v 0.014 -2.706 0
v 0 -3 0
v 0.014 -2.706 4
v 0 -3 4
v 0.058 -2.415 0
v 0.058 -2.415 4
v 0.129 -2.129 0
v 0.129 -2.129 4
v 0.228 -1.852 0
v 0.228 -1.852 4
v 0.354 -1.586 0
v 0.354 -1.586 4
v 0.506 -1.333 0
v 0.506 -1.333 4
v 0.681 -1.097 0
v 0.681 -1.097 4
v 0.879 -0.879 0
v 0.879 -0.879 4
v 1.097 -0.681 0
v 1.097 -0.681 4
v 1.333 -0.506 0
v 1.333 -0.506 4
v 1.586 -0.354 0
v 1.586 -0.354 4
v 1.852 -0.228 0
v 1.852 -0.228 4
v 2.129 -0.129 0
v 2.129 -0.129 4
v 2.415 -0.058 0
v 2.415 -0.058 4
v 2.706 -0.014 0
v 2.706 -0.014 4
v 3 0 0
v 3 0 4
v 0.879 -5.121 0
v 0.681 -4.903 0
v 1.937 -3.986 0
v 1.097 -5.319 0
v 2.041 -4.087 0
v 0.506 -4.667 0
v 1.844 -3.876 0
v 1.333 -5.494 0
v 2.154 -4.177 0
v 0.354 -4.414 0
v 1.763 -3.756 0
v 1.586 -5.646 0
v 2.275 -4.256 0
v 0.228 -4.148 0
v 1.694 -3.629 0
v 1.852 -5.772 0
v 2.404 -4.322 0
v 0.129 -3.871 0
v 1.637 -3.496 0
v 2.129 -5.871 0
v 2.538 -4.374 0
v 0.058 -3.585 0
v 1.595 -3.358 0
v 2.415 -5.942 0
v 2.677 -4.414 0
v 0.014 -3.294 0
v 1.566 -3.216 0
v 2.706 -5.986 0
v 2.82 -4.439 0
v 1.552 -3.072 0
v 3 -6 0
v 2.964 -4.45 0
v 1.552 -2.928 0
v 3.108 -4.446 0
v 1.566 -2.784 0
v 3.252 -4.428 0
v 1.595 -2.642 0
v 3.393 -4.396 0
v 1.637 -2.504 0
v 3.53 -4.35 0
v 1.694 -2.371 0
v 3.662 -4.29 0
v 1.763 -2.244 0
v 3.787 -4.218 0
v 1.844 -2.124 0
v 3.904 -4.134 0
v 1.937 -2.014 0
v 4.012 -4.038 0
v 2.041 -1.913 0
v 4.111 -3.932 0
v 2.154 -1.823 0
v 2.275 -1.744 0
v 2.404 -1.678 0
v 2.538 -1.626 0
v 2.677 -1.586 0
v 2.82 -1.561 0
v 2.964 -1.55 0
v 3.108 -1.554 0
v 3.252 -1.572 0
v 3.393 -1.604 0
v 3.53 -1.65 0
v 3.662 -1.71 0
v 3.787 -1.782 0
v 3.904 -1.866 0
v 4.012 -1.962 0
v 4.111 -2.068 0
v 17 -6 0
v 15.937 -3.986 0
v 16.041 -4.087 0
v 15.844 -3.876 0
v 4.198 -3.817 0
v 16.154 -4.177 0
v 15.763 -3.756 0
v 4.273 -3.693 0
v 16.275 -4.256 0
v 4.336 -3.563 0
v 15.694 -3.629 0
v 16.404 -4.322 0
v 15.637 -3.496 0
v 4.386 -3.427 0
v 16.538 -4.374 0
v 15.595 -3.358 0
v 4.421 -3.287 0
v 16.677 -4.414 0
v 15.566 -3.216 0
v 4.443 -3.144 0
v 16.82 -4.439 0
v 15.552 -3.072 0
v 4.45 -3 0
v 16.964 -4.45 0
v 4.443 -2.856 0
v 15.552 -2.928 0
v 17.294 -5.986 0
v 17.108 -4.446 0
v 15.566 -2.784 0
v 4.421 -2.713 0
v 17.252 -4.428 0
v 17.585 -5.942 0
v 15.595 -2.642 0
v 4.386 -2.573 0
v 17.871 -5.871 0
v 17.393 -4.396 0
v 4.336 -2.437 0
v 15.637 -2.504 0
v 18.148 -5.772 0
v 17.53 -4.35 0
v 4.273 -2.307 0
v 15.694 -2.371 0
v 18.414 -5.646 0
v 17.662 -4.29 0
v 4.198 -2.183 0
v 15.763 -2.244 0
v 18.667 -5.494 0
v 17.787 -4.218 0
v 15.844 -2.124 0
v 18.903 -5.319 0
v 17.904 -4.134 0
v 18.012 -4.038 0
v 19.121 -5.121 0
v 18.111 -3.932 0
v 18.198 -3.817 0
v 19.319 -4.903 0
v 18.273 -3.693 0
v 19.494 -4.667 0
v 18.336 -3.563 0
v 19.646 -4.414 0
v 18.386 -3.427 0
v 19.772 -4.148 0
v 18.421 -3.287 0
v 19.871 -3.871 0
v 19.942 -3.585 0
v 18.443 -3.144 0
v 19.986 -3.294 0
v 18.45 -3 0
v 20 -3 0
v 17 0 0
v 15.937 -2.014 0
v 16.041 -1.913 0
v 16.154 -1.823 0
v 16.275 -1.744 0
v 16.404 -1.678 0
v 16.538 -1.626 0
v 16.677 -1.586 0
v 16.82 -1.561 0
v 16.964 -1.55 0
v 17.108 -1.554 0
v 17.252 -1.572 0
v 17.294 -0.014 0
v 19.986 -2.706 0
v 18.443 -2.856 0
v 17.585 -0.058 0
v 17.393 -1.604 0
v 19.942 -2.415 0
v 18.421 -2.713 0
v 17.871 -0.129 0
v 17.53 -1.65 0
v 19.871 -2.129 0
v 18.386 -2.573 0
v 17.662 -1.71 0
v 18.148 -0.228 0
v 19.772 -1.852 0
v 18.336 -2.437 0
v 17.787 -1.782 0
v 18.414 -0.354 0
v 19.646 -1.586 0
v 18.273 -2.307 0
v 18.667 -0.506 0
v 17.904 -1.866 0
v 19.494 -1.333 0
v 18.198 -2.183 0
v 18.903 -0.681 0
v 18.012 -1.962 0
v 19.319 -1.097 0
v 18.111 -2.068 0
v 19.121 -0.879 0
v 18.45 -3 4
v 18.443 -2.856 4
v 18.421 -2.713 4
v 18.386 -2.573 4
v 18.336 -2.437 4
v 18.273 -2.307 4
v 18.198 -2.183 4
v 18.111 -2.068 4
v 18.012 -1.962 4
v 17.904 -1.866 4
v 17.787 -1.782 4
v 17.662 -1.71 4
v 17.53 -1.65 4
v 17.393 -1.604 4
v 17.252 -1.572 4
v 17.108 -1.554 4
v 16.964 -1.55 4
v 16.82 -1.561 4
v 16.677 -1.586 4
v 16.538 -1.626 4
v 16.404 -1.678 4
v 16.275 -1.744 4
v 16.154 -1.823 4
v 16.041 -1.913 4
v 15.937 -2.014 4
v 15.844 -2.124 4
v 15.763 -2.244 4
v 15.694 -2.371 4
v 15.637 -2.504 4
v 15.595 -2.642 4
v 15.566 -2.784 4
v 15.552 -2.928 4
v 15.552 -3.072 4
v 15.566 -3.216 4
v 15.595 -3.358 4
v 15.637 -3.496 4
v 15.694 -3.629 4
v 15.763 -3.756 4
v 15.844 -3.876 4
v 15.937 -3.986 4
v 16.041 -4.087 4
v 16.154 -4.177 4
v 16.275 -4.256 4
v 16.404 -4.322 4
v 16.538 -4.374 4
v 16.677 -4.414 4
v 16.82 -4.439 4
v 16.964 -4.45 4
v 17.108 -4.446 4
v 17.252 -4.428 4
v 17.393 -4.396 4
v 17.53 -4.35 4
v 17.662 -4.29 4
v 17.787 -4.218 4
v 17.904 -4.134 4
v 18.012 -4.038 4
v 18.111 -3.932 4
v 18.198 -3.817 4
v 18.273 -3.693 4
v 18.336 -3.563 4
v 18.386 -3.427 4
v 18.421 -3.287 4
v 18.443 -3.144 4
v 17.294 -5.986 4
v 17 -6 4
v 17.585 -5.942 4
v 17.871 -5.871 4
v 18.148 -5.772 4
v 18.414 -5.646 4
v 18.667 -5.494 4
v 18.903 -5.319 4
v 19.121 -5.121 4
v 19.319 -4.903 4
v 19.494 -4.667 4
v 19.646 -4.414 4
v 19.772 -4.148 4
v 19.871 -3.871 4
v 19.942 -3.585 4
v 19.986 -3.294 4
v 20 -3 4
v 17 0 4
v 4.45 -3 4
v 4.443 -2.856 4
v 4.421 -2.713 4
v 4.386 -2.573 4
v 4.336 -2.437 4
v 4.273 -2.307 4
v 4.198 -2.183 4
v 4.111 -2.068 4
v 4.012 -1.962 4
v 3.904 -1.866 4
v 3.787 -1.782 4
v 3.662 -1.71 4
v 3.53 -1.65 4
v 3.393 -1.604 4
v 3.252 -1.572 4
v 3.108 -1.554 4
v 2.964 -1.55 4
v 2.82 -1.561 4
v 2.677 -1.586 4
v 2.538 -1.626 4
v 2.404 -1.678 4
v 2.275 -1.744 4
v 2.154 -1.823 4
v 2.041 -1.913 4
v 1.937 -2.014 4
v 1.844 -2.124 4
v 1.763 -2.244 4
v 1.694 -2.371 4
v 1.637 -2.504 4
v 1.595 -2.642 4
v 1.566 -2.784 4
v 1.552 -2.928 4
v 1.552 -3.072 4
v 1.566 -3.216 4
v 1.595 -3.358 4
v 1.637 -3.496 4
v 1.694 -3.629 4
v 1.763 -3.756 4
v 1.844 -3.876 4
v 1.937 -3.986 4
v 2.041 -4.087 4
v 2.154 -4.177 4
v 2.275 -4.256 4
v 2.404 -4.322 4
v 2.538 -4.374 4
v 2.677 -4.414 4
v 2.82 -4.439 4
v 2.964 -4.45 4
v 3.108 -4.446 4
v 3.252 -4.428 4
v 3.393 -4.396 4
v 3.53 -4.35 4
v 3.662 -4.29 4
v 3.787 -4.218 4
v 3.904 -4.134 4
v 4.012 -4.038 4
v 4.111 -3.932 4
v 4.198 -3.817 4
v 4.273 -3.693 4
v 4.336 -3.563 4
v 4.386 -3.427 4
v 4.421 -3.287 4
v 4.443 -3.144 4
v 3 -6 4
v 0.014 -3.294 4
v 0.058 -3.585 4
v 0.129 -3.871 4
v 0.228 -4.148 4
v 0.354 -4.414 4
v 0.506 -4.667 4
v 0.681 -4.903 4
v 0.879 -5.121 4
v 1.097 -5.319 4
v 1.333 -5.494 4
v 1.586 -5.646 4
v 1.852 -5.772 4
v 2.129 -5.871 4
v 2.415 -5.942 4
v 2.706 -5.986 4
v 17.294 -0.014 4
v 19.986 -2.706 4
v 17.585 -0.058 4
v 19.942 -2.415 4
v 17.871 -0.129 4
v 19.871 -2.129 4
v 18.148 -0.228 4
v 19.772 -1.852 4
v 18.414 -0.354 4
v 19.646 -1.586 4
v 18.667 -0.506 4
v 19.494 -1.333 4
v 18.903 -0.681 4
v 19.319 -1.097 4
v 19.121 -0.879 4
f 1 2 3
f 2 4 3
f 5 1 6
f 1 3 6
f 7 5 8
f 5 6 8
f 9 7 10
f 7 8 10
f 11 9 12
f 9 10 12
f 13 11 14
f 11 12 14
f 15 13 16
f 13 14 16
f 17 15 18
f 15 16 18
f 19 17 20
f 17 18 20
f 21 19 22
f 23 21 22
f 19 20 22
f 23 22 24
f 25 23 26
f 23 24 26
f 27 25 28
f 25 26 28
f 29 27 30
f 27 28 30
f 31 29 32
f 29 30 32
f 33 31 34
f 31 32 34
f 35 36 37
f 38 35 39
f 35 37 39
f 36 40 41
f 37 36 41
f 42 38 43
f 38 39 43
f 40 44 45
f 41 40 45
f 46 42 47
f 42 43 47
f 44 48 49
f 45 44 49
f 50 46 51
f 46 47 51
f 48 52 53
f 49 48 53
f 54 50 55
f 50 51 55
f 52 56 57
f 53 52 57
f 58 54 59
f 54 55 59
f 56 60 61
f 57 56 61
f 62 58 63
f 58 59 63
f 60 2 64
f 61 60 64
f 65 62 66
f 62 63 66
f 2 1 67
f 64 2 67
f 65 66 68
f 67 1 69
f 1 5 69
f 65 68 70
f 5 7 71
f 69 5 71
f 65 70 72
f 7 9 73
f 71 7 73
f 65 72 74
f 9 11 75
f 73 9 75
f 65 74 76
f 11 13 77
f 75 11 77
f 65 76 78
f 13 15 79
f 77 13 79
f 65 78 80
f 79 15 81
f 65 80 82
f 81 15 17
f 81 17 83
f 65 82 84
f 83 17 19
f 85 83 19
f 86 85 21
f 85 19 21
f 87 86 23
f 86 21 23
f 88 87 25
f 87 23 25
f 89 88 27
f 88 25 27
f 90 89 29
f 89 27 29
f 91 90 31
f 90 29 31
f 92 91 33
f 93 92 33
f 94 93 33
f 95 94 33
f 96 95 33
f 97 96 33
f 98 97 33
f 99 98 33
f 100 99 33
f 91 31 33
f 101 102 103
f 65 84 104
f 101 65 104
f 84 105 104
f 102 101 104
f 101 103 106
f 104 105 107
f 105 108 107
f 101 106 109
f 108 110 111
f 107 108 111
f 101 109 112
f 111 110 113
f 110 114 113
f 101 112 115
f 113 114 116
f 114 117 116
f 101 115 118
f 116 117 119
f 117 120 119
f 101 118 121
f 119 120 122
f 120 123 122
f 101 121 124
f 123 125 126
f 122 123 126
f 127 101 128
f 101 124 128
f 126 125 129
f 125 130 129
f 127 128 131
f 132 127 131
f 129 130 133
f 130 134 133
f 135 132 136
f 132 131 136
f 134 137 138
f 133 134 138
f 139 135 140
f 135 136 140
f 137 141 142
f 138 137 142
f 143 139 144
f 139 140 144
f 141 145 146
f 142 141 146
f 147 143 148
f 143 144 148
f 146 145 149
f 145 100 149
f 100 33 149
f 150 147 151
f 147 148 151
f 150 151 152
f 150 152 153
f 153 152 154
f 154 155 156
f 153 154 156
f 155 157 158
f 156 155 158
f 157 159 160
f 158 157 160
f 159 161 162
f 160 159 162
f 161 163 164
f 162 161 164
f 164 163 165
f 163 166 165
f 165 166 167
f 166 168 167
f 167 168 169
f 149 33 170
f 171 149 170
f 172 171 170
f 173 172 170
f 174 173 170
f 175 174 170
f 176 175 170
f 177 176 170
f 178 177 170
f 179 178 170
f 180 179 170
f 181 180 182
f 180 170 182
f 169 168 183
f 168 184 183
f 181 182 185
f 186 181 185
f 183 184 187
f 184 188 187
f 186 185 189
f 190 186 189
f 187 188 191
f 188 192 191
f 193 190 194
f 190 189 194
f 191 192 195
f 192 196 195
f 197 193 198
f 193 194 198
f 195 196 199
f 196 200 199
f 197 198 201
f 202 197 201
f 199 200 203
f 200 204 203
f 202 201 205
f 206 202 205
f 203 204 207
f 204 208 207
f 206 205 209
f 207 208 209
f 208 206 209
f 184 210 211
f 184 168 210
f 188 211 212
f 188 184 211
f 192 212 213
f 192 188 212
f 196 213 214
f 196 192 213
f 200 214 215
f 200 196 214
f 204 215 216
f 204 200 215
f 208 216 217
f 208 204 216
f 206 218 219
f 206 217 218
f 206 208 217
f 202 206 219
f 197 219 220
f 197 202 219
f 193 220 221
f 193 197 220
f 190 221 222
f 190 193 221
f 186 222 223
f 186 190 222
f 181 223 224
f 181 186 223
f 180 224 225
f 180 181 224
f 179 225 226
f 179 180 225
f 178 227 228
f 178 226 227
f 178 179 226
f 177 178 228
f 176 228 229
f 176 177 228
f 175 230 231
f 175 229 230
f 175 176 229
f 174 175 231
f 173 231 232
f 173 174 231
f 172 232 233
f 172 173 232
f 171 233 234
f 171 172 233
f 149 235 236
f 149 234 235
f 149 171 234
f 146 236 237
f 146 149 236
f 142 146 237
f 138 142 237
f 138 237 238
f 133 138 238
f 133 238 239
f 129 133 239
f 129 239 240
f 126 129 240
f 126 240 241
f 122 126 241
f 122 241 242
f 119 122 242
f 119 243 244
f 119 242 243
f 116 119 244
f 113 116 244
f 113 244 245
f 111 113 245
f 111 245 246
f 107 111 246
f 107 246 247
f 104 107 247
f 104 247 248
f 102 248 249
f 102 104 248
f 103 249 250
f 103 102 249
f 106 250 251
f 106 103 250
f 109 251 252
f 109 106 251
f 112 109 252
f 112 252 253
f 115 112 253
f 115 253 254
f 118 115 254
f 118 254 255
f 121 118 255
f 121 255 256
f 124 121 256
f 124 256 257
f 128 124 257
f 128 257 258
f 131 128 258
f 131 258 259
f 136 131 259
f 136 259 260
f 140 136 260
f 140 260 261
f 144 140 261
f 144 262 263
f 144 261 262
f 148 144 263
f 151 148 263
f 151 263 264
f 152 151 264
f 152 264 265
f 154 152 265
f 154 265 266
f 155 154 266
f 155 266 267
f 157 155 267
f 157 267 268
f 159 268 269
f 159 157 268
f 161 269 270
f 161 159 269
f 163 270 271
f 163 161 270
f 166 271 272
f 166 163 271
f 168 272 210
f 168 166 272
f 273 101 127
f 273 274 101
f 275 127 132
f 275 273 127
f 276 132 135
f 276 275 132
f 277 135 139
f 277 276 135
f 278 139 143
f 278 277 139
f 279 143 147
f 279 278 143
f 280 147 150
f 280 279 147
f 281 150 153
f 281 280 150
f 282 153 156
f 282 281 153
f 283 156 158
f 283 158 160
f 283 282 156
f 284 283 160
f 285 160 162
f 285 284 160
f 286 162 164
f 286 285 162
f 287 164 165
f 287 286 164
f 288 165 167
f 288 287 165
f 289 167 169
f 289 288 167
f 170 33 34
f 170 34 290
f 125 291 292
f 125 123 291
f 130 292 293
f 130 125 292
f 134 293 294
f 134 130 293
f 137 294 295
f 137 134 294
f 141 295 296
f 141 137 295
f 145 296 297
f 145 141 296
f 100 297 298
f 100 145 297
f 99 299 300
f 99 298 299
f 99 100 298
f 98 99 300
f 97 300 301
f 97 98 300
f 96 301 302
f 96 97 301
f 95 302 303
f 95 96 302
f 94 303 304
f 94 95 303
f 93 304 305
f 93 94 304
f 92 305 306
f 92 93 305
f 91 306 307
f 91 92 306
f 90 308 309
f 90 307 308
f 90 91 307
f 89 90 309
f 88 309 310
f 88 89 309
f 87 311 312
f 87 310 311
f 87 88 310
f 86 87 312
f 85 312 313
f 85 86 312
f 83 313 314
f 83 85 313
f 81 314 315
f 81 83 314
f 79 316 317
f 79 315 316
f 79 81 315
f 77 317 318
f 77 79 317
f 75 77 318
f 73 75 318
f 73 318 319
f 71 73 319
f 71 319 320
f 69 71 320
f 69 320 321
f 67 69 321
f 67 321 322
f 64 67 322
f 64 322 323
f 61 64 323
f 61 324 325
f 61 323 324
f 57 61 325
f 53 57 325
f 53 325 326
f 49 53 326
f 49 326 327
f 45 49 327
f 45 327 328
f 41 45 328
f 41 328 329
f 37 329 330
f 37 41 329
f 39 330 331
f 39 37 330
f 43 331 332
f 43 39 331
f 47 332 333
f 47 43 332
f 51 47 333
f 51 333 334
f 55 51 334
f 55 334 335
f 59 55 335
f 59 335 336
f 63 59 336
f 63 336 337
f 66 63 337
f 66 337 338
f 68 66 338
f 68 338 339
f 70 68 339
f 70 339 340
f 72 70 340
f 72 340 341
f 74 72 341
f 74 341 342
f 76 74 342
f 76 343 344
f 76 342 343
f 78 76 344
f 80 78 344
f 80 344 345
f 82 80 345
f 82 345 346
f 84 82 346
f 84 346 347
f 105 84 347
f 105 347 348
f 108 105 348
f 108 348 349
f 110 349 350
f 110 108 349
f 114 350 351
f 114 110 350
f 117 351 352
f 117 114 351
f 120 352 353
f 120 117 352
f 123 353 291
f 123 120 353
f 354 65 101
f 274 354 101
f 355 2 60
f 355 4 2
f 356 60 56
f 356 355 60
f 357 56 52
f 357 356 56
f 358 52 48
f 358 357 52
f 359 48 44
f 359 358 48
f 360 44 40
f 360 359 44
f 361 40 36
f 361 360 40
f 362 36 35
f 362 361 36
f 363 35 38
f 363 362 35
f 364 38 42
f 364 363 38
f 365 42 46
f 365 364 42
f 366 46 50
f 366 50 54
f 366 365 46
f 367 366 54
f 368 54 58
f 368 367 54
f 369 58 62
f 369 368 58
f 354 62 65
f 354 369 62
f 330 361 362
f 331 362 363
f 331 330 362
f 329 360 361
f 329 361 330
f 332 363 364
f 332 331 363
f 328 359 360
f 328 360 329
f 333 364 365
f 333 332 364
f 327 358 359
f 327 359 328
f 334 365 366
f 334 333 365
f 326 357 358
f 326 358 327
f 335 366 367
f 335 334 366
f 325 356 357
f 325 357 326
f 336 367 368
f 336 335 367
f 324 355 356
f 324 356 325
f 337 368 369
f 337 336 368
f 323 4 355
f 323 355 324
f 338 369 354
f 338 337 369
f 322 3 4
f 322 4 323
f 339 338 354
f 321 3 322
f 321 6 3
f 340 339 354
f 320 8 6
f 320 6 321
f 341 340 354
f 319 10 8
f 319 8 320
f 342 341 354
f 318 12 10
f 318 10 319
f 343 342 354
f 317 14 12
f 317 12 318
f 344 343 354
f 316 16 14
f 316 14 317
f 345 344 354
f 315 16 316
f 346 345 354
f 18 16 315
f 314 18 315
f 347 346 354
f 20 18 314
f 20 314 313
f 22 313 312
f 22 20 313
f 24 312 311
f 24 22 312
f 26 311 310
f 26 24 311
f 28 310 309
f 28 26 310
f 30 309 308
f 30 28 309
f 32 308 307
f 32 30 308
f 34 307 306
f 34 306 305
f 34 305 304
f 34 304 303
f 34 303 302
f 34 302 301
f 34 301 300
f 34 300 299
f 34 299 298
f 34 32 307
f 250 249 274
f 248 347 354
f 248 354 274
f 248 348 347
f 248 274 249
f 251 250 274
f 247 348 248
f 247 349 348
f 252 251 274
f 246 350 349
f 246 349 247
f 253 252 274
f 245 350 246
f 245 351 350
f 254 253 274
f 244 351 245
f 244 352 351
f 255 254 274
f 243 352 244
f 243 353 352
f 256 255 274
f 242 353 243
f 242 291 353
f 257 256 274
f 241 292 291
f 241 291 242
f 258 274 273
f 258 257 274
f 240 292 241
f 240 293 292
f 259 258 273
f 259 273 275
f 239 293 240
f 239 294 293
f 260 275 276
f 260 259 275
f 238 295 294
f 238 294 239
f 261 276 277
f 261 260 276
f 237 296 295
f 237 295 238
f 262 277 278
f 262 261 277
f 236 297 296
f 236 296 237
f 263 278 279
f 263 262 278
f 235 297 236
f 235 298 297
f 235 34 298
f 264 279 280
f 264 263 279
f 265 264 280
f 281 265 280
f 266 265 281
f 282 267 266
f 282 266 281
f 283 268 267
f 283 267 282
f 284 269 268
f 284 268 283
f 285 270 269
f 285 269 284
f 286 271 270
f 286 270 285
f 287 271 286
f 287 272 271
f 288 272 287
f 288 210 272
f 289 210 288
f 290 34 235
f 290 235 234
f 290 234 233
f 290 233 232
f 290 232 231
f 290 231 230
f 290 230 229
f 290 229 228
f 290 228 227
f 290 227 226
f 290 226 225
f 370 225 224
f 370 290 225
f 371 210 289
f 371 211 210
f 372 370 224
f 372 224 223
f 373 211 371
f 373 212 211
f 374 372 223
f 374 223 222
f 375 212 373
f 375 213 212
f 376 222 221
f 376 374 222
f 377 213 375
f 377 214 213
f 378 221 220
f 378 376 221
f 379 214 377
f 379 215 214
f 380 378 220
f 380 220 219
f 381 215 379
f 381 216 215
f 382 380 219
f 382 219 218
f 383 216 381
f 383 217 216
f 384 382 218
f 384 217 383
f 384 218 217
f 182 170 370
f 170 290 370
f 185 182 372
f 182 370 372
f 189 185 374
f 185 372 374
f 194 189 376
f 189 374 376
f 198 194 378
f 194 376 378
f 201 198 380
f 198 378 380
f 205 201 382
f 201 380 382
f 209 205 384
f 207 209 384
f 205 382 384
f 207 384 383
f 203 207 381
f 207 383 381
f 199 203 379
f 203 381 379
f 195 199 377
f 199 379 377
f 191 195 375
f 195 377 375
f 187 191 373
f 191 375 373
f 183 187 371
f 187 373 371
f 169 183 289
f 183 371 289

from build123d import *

# Parameters (mm, degrees)
SKETCH1_W               = 20
SKETCH1_H               = 6
BOSS_EXTRUDE1_DEPTH     = 4
CUT_EXTRUDE1_DEPTH      = 22.260291625
CUT_EXTRUDE1_DEPTH_BACK = 22.260291625
SKETCH2_R               = 1.45
FILLET1_R               = 3


with BuildPart() as part:
    # Sketch1 → Boss-Extrude1 (new body)
    with BuildSketch(Plane.XY):
        with Locations((10, -3)):
            Rectangle(SKETCH1_W, SKETCH1_H)
    extrude(amount=BOSS_EXTRUDE1_DEPTH)

    # Sketch2 → Cut-Extrude1 (cut, two sides: drawn at the far end of the back side and taken through both)
    with BuildSketch(Plane.XY.offset(4).offset(-CUT_EXTRUDE1_DEPTH_BACK)):
        with Locations((3, -3)):
            Circle(SKETCH2_R)
        with Locations((17, -3)):
            Circle(SKETCH2_R)
    extrude(amount=CUT_EXTRUDE1_DEPTH + CUT_EXTRUDE1_DEPTH_BACK, mode=Mode.SUBTRACT)

    # Fillet1
    fillet1_edges = [part.edges().sort_by_distance(p)[0] for p in [
        (20, -6, 2),
        (20, 0, 2),
        (0, -6, 2),
        (0, 0, 2),
    ]]
    fillet(fillet1_edges, radius=FILLET1_R - 0.0001)  # a hair under: the kernel refuses the full size


solid = part.part
